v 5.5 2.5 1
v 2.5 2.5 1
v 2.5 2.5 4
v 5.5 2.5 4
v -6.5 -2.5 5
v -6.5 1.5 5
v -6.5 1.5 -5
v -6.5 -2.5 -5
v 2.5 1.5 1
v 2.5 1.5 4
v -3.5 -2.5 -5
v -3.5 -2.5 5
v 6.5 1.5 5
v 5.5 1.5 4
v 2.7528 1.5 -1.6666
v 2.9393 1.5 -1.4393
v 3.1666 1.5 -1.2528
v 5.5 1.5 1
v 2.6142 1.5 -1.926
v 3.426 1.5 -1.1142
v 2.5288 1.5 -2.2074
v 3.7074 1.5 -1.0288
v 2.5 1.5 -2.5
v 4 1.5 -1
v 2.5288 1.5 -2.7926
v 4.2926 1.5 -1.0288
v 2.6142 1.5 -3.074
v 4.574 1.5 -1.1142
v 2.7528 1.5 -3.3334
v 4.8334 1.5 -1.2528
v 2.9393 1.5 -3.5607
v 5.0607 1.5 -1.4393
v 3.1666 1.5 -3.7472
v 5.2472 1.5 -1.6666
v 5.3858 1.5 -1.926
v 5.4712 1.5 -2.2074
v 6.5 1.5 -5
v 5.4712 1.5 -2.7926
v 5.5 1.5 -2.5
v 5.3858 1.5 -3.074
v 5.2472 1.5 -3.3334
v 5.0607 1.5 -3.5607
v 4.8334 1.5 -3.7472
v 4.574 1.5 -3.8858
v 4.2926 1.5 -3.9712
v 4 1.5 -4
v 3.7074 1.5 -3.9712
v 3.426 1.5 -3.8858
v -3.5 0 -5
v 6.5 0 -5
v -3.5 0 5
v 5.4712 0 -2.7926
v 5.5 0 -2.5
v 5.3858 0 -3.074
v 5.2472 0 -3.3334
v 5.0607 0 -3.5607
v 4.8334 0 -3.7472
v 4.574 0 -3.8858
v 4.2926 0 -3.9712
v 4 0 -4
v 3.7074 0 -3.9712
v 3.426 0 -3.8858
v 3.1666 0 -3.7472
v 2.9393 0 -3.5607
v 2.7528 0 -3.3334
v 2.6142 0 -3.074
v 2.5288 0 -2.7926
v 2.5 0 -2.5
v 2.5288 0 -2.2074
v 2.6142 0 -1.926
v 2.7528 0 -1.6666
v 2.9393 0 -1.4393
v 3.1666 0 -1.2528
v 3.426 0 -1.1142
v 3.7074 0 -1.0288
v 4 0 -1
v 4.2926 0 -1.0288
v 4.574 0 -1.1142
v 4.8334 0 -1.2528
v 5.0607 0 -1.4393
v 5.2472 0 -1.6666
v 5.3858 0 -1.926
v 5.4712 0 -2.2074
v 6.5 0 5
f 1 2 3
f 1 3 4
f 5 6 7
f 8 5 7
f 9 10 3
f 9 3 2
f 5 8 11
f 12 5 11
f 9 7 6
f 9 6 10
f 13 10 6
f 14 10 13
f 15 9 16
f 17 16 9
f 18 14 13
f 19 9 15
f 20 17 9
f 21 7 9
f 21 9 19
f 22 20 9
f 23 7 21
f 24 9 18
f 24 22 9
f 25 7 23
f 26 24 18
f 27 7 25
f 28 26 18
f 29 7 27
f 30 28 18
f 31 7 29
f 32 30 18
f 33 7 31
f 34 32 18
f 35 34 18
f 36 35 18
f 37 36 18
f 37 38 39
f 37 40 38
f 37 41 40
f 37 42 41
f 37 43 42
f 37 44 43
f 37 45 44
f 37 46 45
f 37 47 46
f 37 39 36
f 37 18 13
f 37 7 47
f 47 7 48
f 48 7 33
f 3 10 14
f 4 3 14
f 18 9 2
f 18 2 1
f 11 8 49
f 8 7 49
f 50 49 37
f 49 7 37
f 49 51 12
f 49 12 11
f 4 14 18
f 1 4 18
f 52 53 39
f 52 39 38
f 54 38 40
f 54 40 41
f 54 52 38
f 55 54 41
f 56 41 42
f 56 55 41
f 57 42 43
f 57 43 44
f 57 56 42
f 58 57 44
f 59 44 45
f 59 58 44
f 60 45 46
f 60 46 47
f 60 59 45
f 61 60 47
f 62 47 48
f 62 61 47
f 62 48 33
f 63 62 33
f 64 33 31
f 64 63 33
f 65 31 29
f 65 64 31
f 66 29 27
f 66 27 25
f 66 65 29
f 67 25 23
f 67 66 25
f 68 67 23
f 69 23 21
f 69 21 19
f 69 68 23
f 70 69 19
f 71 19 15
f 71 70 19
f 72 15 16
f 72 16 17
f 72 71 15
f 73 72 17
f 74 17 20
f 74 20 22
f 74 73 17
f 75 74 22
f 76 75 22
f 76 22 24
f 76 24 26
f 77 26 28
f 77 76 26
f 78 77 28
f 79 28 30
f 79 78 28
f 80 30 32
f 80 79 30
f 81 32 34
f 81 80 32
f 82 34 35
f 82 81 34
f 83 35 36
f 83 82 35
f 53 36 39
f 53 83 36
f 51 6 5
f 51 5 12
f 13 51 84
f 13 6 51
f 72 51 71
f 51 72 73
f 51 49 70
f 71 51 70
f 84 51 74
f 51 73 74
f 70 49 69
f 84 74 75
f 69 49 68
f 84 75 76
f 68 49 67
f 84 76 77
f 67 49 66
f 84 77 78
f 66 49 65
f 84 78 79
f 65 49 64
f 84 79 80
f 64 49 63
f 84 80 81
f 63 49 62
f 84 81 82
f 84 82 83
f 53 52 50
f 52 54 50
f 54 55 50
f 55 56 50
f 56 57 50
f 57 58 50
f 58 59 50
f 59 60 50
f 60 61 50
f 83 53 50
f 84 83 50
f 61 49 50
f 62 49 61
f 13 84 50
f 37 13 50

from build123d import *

# Parameters (mm, degrees)
SKETCH_1_W      = 3
SKETCH_1_H      = 10
SKETCH_1_W_2    = 10
SKETCH_1_H_2    = 3
SKETCH_1_R      = 1.5
EXTRUDE_1_DEPTH = 1.5
SKETCH_1_3_W    = 3
SKETCH_1_3_H    = 10
EXTRUDE_2_DEPTH = 2.5
EXTRUDE_START   = 1.5
SKETCH_1_4_W    = 3
SKETCH_1_4_H    = 3
EXTRUDE_3_DEPTH = 1


with BuildPart() as part:
    # Эскиз1 → Бобышка-Вытянуть1 (new body)
    with BuildSketch(Plane(origin=(0, 0, 0), x_dir=(1, 0, 0), z_dir=(0, 1, 0))):
        with Locations((-5, 0)):
            Rectangle(SKETCH_1_W, SKETCH_1_H)
        with Locations((1.5, 0)):
            Rectangle(SKETCH_1_W_2, SKETCH_1_H)
        with Locations((4, -2.5)):
            Rectangle(SKETCH_1_W, SKETCH_1_H_2, mode=Mode.SUBTRACT)
        with Locations((4, 2.5)):
            Circle(SKETCH_1_R, mode=Mode.SUBTRACT)
        with Locations((4, -2.5)):
            Rectangle(SKETCH_1_W, SKETCH_1_H_2)
    extrude(amount=EXTRUDE_1_DEPTH)

    # Эскиз1<3> → Бобышка-Вытянуть2 (add)
    with BuildSketch(Plane(origin=(0, 0, 0), x_dir=(1, 0, 0), z_dir=(0, 1, 0))):
        with Locations((-5, 0)):
            Rectangle(SKETCH_1_3_W, SKETCH_1_3_H)
    extrude(amount=-EXTRUDE_2_DEPTH)

    # Эскиз1<4> → Бобышка-Вытянуть3 (add)
    with BuildSketch(Plane(origin=(0, 0, 0), x_dir=(1, 0, 0), z_dir=(0, 1, 0)).offset(EXTRUDE_START)):
        with Locations((4, -2.5)):
            Rectangle(SKETCH_1_4_W, SKETCH_1_4_H)
    extrude(amount=EXTRUDE_3_DEPTH)


solid = part.part
